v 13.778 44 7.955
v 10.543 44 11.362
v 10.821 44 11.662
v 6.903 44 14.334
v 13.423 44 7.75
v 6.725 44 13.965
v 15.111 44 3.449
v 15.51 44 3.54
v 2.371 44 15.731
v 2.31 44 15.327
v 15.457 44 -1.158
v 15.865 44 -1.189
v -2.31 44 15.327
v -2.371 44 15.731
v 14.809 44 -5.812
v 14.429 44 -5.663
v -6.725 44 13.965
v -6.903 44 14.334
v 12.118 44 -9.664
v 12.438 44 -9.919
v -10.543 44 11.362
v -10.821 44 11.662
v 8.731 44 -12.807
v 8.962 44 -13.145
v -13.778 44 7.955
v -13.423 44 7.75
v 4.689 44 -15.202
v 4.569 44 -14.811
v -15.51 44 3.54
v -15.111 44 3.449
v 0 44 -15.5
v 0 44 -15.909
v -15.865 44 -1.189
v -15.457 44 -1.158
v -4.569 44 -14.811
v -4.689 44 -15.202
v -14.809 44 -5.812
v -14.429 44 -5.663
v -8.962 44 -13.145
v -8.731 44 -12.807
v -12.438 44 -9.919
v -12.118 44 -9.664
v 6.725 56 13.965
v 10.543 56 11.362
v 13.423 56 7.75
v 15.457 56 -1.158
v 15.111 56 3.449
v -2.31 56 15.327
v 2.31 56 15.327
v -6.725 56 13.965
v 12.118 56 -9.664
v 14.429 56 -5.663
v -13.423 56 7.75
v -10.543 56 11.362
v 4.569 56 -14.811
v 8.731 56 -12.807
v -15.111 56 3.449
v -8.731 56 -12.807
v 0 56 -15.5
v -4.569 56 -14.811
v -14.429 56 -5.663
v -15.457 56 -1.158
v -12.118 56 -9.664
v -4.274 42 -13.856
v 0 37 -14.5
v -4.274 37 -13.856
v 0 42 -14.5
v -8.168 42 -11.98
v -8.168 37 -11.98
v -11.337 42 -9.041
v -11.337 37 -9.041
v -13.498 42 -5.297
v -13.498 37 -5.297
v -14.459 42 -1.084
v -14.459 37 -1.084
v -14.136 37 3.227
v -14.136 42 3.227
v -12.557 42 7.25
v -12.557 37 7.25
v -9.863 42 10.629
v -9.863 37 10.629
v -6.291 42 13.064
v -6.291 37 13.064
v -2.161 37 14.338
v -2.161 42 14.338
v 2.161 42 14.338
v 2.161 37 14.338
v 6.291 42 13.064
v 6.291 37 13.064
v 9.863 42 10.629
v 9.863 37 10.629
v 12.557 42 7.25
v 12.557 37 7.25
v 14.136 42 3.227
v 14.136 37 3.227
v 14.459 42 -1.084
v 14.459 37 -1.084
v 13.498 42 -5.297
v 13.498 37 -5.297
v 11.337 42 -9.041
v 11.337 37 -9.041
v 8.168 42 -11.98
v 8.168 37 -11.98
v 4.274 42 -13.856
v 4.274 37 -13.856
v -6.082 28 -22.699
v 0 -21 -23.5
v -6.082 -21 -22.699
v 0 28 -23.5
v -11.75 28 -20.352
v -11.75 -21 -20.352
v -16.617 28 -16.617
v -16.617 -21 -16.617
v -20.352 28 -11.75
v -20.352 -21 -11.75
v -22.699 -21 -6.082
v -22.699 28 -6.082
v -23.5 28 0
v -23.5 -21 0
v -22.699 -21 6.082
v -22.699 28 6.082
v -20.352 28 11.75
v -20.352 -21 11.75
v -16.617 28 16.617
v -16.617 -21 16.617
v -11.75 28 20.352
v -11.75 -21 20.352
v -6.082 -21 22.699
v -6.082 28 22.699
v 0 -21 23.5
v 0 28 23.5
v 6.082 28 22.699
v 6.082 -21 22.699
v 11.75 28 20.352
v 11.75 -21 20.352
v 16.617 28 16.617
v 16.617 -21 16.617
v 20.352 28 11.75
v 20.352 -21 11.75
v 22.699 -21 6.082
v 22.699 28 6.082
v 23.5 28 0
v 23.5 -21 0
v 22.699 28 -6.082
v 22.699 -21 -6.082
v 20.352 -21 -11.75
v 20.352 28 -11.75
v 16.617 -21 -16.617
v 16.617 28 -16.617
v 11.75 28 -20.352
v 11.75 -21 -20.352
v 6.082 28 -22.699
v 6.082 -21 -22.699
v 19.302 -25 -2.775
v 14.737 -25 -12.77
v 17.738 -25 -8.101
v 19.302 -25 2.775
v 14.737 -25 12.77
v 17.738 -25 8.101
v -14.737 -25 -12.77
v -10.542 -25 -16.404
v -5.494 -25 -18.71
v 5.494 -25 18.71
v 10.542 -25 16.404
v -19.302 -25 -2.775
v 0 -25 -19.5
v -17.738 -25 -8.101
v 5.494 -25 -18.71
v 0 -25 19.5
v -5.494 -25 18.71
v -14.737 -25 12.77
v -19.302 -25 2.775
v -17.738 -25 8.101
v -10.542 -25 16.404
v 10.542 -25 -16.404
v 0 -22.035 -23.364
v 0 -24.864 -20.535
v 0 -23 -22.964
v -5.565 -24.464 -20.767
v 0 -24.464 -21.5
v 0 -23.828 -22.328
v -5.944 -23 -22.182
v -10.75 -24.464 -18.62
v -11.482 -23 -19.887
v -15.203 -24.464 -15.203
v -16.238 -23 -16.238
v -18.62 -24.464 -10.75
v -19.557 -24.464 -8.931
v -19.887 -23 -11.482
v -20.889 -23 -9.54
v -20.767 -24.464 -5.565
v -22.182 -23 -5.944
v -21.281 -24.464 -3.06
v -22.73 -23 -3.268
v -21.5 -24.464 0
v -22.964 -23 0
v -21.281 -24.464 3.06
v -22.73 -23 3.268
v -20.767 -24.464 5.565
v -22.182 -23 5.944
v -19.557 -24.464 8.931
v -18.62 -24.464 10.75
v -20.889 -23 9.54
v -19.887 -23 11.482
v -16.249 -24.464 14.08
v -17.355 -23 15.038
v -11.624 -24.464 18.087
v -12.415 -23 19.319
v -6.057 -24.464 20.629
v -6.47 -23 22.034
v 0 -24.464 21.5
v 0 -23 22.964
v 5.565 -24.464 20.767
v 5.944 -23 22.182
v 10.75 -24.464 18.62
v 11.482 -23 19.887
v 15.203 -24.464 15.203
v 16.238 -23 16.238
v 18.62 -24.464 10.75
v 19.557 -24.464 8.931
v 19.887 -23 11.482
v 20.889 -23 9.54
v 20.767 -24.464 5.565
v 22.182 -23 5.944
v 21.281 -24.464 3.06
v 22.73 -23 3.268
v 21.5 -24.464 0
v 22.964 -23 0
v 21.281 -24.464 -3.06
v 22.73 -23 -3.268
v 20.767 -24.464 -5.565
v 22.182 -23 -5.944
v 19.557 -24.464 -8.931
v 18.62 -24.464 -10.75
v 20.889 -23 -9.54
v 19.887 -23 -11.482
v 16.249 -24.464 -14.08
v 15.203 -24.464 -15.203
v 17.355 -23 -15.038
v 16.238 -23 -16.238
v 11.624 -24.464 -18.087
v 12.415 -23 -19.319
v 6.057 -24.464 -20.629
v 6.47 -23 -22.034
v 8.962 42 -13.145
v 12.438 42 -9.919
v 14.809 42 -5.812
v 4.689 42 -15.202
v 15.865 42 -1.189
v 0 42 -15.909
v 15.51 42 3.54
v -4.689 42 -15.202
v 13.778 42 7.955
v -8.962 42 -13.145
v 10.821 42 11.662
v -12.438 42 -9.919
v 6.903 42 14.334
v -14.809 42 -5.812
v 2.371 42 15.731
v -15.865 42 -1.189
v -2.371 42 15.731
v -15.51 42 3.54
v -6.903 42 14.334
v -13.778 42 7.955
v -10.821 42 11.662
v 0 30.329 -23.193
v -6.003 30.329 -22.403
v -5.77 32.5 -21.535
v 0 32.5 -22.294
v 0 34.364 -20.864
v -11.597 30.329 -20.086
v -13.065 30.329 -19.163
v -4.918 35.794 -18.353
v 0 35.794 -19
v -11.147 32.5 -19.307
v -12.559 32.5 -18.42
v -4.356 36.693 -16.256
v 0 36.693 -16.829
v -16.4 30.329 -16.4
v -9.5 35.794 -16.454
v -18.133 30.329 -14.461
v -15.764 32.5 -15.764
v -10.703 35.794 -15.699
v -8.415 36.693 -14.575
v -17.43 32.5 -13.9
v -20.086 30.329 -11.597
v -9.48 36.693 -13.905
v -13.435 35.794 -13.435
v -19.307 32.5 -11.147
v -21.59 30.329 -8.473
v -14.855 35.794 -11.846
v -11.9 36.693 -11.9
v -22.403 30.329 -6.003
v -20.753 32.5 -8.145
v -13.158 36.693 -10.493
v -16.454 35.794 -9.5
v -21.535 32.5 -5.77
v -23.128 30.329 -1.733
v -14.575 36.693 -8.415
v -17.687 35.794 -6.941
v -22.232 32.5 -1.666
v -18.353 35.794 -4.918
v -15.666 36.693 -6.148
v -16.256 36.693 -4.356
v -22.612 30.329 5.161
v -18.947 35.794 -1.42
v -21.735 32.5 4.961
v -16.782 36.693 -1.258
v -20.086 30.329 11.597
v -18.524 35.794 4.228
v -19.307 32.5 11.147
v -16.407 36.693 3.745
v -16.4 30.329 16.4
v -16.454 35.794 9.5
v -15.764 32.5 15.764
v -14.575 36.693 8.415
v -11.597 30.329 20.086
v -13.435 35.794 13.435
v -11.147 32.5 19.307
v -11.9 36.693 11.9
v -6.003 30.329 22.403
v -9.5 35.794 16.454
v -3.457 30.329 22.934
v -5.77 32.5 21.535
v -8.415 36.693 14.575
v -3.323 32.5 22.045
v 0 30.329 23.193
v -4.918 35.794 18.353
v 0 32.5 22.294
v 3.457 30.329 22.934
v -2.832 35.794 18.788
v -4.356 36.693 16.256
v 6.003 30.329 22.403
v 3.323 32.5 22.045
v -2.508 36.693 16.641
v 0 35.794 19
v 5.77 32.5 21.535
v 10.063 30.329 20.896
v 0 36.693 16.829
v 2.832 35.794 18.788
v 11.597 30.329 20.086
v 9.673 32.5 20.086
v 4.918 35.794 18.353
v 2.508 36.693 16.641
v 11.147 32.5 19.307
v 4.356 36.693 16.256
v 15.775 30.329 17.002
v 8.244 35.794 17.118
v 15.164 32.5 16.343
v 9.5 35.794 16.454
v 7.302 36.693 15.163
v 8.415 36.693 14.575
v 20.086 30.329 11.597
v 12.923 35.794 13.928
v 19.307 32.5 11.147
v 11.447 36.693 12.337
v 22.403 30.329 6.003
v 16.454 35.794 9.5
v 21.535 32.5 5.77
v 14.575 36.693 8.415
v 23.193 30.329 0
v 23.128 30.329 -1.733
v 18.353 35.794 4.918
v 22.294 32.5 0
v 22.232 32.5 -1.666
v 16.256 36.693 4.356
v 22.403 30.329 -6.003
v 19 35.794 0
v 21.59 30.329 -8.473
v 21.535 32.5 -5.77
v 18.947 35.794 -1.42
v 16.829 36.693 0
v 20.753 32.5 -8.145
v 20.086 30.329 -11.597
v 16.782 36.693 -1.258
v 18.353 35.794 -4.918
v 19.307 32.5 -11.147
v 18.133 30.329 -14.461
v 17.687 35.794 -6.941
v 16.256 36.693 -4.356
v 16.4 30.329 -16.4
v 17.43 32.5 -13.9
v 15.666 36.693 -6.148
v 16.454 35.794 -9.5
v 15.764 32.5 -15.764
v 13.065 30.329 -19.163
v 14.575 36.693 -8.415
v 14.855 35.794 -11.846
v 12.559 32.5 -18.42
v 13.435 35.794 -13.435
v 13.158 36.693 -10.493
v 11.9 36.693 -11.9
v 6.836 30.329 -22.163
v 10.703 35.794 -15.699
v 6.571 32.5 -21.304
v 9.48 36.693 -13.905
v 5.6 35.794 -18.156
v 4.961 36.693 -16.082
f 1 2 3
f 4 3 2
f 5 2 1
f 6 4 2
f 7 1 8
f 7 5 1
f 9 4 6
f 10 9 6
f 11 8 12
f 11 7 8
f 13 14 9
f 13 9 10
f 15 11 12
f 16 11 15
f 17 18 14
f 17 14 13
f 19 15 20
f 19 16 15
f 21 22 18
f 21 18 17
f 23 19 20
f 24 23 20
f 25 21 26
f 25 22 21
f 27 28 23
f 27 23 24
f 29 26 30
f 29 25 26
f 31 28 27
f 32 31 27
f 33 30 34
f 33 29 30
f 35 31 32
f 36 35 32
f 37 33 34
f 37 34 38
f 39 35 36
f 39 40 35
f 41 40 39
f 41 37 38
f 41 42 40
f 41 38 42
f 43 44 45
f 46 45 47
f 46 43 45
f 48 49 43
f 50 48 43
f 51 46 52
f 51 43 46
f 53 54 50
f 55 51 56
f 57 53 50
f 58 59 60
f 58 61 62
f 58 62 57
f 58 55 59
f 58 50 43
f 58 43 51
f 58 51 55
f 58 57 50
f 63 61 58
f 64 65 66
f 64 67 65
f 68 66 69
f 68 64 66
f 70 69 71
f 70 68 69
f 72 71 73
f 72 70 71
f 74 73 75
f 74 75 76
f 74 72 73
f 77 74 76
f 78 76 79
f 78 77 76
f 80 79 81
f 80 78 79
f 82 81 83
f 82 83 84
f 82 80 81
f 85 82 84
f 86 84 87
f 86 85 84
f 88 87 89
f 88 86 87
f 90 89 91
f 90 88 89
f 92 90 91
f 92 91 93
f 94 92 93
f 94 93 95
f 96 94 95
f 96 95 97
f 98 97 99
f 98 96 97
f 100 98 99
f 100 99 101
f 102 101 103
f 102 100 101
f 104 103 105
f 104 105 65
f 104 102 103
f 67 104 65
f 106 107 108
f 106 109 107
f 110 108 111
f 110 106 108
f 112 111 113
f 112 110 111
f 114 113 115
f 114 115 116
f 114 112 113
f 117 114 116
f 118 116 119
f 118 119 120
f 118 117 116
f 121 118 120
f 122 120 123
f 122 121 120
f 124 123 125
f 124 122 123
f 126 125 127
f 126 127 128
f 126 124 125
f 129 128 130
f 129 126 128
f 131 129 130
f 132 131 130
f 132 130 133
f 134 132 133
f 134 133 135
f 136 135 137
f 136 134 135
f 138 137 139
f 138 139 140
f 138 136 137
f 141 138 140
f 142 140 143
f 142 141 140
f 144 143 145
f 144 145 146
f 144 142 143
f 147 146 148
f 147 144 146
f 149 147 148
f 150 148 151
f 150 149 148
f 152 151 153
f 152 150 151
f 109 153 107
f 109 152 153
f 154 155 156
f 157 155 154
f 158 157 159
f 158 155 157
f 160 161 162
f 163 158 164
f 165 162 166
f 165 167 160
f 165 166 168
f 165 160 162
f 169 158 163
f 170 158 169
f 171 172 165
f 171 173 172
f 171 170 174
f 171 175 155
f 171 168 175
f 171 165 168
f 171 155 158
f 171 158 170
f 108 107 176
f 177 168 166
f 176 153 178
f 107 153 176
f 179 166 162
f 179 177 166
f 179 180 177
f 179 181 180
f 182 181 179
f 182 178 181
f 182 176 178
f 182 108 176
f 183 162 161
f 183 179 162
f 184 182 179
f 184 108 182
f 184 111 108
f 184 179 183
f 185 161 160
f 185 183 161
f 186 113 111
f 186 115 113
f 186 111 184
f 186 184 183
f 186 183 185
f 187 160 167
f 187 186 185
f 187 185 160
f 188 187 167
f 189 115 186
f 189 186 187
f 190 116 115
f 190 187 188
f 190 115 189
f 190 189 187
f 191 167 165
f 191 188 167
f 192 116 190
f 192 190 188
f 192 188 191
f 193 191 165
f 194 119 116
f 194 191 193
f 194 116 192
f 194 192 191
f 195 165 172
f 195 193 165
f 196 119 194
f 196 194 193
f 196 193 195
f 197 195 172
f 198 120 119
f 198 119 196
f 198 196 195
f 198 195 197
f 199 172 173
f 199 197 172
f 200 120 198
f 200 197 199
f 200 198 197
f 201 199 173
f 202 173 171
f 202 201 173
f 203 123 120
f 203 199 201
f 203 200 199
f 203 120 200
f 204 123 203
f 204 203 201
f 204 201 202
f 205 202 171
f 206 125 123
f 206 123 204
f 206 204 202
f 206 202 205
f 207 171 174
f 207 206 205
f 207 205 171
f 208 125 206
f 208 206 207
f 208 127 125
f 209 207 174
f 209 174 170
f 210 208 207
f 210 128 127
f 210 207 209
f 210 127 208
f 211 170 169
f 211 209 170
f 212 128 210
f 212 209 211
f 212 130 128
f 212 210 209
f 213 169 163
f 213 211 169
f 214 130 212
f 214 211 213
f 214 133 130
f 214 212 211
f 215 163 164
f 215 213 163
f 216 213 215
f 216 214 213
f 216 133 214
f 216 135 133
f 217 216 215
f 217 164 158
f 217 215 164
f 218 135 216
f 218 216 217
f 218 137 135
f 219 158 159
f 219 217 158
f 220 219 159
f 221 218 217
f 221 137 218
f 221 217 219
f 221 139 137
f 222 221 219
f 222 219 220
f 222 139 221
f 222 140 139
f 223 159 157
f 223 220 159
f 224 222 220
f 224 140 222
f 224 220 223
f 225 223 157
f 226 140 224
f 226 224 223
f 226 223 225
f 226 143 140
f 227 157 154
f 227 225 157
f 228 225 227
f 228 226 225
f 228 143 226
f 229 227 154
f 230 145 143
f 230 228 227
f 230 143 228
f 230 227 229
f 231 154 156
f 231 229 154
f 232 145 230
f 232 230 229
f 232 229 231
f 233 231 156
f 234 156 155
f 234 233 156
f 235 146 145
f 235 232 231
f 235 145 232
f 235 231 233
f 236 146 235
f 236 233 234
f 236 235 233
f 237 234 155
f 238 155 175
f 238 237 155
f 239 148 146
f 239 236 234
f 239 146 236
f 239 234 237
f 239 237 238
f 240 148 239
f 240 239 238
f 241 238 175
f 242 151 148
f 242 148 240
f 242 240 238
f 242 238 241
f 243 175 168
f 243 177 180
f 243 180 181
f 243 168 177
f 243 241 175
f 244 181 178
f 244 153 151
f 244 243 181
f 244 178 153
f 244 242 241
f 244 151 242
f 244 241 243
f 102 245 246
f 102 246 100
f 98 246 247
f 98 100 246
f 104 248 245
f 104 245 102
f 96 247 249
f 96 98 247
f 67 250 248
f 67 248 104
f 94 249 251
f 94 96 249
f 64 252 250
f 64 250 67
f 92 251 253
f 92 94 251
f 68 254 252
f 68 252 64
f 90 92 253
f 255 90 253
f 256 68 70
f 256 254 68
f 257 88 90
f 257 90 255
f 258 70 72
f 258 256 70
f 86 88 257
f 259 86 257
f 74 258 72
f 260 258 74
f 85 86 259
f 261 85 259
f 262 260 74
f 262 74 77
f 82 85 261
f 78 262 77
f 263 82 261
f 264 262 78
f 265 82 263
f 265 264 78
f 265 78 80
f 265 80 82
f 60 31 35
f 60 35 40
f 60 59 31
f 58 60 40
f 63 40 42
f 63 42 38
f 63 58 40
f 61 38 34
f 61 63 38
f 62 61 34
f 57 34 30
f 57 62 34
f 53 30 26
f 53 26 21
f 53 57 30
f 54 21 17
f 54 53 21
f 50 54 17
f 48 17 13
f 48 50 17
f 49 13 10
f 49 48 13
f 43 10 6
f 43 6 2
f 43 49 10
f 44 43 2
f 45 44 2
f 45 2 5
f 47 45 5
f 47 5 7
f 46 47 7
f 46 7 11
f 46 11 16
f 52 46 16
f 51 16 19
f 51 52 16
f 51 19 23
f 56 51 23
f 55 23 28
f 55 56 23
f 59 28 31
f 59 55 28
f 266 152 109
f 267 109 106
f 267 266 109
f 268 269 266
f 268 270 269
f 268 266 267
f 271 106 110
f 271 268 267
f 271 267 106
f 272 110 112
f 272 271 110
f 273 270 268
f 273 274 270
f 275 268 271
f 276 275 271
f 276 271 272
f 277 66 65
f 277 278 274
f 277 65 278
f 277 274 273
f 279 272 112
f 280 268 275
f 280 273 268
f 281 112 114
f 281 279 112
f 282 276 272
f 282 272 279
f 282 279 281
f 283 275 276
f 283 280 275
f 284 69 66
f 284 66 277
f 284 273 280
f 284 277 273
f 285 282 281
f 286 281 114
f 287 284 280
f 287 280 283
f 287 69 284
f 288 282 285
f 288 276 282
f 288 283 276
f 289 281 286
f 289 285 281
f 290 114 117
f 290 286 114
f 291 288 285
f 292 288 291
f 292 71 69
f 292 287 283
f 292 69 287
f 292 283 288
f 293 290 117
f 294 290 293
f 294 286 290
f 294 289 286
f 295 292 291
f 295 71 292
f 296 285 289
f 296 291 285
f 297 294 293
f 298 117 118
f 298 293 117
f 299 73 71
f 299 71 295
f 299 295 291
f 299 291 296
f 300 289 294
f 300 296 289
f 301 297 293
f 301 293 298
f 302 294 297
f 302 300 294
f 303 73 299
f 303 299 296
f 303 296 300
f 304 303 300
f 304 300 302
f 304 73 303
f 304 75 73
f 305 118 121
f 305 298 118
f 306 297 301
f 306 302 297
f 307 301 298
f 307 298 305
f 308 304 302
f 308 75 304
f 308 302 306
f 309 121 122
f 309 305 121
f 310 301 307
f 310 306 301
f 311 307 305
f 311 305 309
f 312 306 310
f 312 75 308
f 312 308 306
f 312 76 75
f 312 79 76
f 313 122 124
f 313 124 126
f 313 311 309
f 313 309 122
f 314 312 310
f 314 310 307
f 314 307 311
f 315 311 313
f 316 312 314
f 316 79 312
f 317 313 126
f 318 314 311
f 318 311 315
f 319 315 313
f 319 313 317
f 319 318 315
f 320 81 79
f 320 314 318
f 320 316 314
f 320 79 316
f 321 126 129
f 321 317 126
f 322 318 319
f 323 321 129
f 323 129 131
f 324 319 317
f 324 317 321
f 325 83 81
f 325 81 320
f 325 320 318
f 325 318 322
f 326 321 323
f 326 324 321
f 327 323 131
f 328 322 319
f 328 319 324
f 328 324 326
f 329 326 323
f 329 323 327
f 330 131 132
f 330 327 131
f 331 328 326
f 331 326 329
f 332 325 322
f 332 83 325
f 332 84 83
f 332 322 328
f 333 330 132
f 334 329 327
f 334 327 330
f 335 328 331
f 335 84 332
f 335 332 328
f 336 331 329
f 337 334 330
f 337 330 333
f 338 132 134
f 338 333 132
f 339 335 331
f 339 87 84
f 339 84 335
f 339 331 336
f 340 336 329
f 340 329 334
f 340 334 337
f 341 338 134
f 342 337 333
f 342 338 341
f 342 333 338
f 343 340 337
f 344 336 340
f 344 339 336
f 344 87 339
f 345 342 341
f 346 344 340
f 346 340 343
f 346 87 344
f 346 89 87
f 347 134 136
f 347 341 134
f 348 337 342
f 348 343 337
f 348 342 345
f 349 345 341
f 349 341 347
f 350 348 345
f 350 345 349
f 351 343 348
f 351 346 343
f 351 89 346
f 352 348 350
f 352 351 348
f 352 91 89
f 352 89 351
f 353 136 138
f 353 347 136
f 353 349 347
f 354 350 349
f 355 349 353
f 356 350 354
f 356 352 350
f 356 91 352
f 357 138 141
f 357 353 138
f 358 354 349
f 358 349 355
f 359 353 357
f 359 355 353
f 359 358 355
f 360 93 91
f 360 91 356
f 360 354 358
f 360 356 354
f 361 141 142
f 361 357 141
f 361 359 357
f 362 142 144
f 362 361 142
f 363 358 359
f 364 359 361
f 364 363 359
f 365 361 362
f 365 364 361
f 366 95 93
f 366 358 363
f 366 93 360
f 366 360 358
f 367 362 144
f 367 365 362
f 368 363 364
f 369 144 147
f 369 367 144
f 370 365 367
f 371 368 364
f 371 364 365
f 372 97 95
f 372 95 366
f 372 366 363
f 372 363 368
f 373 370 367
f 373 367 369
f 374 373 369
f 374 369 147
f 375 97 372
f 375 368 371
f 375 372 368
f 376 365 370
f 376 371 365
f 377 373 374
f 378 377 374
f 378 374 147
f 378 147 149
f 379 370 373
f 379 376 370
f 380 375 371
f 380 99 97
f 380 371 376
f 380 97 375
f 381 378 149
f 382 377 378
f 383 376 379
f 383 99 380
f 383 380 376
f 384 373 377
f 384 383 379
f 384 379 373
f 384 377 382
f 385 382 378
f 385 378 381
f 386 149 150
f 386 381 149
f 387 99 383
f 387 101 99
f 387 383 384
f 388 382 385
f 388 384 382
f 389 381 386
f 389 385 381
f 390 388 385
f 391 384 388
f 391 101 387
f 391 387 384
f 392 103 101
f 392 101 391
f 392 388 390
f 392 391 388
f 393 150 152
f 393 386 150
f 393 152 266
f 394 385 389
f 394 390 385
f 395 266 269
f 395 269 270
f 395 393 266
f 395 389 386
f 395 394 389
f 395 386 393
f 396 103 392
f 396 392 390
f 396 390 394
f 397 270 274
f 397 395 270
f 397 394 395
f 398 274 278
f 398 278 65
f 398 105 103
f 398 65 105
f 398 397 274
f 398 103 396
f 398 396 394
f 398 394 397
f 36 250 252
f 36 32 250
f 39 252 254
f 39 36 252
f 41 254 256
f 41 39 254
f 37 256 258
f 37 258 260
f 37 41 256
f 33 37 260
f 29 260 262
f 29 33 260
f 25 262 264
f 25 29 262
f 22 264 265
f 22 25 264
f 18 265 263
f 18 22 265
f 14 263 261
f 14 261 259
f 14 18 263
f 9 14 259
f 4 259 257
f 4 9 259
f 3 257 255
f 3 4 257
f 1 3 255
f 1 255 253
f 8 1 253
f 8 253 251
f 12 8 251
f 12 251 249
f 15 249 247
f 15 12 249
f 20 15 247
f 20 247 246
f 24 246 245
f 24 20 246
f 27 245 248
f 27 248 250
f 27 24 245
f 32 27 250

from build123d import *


with BuildPart() as part:
    # 草图1 → 旋转1 (revolve)
    with BuildSketch(Plane.XY, mode=Mode.PRIVATE) as revolve_1_sk:
        with BuildLine():
            Line((0, 56), (0, -25))
            Line((0, -25), (19.5, -25))
            ThreePointArc((19.5, -25), (22.328427125, -23.828427125), (23.5, -21))
            Line((23.5, -21), (23.5, 25))
            Line((23.5, 25), (23.5, 28))
            ThreePointArc((23.5, 28), (20.863961031, 34.363961031), (14.5, 37))
            Line((14.5, 37), (14.5, 42))
            Line((14.5, 42), (15.90903206, 42))
            Line((15.90903206, 42), (15.90903206, 44))
            Line((15.90903206, 44), (15.5, 44))
            Line((15.5, 44), (15.5, 56))
            Line((15.5, 56), (0, 56))
        make_face()
    revolve(revolve_1_sk.sketch.rotate(Axis((0, 0, 0), (0, 1, 0)), 90), axis=Axis((0, 0, 0), (0, 1, 0)))


solid = part.part
